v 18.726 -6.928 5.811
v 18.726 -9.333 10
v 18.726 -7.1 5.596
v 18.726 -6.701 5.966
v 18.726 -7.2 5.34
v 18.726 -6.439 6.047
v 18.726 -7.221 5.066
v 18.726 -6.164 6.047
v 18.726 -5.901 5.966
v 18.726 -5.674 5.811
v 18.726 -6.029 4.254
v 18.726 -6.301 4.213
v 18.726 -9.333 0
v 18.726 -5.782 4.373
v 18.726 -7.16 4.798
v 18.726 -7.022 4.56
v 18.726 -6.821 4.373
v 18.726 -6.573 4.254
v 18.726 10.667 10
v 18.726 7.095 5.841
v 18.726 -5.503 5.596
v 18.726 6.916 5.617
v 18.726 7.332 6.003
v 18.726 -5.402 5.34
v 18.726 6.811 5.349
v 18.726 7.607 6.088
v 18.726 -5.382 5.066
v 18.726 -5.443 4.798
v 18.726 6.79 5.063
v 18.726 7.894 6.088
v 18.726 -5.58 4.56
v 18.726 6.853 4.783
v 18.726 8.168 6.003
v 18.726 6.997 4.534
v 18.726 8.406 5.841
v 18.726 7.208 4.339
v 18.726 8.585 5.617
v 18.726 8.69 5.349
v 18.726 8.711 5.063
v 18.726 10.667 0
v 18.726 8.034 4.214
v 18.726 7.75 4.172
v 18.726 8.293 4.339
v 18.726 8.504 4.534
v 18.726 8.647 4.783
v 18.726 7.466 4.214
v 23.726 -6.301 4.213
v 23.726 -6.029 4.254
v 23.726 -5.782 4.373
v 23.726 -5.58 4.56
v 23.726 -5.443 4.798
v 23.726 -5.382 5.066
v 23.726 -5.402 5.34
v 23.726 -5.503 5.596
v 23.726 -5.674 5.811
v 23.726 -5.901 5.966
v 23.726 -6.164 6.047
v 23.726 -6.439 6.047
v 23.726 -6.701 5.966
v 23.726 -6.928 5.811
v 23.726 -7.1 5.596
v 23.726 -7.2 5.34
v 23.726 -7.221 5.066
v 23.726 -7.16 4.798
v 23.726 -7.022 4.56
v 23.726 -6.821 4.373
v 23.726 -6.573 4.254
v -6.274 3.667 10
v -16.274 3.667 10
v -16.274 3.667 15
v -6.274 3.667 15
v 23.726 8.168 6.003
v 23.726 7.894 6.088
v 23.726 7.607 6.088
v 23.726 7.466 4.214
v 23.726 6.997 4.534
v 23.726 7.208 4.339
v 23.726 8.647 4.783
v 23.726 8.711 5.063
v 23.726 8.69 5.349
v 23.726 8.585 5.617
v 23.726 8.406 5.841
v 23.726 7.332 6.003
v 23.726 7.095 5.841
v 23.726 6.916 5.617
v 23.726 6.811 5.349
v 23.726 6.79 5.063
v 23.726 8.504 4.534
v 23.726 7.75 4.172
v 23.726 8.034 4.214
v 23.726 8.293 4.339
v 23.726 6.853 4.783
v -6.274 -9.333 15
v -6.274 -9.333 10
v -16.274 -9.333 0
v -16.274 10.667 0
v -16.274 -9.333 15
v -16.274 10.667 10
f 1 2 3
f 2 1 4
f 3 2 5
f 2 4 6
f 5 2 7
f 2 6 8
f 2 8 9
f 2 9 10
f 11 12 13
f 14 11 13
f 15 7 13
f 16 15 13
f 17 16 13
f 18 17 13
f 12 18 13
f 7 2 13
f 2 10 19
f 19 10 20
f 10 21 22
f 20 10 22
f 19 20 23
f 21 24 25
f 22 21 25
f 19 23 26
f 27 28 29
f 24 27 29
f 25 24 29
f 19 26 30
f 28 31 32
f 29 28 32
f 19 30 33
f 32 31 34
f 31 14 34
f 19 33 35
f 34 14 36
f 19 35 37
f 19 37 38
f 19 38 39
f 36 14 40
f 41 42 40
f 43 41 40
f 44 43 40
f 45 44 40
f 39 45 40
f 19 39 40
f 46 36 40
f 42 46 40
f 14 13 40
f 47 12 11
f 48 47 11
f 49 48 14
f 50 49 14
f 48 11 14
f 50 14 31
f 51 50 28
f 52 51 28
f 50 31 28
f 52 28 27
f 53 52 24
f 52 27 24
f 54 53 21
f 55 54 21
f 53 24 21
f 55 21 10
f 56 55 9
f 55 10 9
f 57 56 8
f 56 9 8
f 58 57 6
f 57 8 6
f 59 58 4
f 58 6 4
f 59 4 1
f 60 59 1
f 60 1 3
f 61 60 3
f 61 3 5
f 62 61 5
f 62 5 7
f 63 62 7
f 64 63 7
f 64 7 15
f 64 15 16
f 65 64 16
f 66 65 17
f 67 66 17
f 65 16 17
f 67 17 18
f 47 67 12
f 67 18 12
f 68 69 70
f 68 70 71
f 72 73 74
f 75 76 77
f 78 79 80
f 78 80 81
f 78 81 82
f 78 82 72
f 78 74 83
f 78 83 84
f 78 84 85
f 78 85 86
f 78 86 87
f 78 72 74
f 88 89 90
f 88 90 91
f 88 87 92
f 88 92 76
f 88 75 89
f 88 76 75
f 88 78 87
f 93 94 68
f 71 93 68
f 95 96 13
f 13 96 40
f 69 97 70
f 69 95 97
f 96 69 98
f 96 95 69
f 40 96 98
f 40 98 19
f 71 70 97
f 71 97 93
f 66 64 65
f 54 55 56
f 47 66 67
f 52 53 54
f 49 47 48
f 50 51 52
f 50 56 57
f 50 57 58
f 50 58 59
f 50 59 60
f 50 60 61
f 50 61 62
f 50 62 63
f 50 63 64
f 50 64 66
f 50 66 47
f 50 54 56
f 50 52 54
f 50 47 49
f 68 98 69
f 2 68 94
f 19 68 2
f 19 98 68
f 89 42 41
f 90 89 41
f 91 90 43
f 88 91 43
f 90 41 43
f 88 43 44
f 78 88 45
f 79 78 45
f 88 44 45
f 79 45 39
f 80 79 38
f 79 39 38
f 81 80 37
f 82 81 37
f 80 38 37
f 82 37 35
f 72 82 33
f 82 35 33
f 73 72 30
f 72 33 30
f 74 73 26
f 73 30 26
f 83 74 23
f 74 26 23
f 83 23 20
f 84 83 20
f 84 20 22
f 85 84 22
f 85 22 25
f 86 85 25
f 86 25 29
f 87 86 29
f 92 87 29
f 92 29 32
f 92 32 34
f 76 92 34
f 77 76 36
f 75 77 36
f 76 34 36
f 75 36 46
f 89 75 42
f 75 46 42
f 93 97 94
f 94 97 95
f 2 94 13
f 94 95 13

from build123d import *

# Parameters (mm, degrees)
ESBO_O1_W                = 35
ESBO_O1_H                = 20
RESSALTO_EXTRUS_O1_DEPTH = 10
ESBO_O2_W                = 10
ESBO_O2_H                = 13
RESSALTO_EXTRUS_O2_DEPTH = 5
ESBO_O3_R                = 0.922121428
ESBO_O3_R_2              = 0.963466347
RESSALTO_EXTRUS_O3_DEPTH = 5


with BuildPart() as part:
    # Esboço1 → Ressalto-extrusão1 (new body)
    with BuildSketch(Plane.XY):
        with Locations((1.225709868, 0.66677589)):
            Rectangle(ESBO_O1_W, ESBO_O1_H)
    extrude(amount=RESSALTO_EXTRUS_O1_DEPTH)

    # Esboço2 → Ressalto-extrusão2 (add)
    with BuildSketch(Plane.XY.offset(10)):
        with Locations((-11.274290132, -2.83322411)):
            Rectangle(ESBO_O2_W, ESBO_O2_H)
    extrude(amount=RESSALTO_EXTRUS_O2_DEPTH)

    # Esboço3 → Ressalto-extrusão3 (add)
    with BuildSketch(Plane(origin=(18.725709868, 0, 0), x_dir=(0, 0, -1), z_dir=(1, 0, 0))):
        with Locations((-5.13508621, -6.301169804)):
            Circle(ESBO_O3_R)
        with Locations((-5.13508621, 7.750286856)):
            Circle(ESBO_O3_R_2)
    extrude(amount=RESSALTO_EXTRUS_O3_DEPTH)


solid = part.part
